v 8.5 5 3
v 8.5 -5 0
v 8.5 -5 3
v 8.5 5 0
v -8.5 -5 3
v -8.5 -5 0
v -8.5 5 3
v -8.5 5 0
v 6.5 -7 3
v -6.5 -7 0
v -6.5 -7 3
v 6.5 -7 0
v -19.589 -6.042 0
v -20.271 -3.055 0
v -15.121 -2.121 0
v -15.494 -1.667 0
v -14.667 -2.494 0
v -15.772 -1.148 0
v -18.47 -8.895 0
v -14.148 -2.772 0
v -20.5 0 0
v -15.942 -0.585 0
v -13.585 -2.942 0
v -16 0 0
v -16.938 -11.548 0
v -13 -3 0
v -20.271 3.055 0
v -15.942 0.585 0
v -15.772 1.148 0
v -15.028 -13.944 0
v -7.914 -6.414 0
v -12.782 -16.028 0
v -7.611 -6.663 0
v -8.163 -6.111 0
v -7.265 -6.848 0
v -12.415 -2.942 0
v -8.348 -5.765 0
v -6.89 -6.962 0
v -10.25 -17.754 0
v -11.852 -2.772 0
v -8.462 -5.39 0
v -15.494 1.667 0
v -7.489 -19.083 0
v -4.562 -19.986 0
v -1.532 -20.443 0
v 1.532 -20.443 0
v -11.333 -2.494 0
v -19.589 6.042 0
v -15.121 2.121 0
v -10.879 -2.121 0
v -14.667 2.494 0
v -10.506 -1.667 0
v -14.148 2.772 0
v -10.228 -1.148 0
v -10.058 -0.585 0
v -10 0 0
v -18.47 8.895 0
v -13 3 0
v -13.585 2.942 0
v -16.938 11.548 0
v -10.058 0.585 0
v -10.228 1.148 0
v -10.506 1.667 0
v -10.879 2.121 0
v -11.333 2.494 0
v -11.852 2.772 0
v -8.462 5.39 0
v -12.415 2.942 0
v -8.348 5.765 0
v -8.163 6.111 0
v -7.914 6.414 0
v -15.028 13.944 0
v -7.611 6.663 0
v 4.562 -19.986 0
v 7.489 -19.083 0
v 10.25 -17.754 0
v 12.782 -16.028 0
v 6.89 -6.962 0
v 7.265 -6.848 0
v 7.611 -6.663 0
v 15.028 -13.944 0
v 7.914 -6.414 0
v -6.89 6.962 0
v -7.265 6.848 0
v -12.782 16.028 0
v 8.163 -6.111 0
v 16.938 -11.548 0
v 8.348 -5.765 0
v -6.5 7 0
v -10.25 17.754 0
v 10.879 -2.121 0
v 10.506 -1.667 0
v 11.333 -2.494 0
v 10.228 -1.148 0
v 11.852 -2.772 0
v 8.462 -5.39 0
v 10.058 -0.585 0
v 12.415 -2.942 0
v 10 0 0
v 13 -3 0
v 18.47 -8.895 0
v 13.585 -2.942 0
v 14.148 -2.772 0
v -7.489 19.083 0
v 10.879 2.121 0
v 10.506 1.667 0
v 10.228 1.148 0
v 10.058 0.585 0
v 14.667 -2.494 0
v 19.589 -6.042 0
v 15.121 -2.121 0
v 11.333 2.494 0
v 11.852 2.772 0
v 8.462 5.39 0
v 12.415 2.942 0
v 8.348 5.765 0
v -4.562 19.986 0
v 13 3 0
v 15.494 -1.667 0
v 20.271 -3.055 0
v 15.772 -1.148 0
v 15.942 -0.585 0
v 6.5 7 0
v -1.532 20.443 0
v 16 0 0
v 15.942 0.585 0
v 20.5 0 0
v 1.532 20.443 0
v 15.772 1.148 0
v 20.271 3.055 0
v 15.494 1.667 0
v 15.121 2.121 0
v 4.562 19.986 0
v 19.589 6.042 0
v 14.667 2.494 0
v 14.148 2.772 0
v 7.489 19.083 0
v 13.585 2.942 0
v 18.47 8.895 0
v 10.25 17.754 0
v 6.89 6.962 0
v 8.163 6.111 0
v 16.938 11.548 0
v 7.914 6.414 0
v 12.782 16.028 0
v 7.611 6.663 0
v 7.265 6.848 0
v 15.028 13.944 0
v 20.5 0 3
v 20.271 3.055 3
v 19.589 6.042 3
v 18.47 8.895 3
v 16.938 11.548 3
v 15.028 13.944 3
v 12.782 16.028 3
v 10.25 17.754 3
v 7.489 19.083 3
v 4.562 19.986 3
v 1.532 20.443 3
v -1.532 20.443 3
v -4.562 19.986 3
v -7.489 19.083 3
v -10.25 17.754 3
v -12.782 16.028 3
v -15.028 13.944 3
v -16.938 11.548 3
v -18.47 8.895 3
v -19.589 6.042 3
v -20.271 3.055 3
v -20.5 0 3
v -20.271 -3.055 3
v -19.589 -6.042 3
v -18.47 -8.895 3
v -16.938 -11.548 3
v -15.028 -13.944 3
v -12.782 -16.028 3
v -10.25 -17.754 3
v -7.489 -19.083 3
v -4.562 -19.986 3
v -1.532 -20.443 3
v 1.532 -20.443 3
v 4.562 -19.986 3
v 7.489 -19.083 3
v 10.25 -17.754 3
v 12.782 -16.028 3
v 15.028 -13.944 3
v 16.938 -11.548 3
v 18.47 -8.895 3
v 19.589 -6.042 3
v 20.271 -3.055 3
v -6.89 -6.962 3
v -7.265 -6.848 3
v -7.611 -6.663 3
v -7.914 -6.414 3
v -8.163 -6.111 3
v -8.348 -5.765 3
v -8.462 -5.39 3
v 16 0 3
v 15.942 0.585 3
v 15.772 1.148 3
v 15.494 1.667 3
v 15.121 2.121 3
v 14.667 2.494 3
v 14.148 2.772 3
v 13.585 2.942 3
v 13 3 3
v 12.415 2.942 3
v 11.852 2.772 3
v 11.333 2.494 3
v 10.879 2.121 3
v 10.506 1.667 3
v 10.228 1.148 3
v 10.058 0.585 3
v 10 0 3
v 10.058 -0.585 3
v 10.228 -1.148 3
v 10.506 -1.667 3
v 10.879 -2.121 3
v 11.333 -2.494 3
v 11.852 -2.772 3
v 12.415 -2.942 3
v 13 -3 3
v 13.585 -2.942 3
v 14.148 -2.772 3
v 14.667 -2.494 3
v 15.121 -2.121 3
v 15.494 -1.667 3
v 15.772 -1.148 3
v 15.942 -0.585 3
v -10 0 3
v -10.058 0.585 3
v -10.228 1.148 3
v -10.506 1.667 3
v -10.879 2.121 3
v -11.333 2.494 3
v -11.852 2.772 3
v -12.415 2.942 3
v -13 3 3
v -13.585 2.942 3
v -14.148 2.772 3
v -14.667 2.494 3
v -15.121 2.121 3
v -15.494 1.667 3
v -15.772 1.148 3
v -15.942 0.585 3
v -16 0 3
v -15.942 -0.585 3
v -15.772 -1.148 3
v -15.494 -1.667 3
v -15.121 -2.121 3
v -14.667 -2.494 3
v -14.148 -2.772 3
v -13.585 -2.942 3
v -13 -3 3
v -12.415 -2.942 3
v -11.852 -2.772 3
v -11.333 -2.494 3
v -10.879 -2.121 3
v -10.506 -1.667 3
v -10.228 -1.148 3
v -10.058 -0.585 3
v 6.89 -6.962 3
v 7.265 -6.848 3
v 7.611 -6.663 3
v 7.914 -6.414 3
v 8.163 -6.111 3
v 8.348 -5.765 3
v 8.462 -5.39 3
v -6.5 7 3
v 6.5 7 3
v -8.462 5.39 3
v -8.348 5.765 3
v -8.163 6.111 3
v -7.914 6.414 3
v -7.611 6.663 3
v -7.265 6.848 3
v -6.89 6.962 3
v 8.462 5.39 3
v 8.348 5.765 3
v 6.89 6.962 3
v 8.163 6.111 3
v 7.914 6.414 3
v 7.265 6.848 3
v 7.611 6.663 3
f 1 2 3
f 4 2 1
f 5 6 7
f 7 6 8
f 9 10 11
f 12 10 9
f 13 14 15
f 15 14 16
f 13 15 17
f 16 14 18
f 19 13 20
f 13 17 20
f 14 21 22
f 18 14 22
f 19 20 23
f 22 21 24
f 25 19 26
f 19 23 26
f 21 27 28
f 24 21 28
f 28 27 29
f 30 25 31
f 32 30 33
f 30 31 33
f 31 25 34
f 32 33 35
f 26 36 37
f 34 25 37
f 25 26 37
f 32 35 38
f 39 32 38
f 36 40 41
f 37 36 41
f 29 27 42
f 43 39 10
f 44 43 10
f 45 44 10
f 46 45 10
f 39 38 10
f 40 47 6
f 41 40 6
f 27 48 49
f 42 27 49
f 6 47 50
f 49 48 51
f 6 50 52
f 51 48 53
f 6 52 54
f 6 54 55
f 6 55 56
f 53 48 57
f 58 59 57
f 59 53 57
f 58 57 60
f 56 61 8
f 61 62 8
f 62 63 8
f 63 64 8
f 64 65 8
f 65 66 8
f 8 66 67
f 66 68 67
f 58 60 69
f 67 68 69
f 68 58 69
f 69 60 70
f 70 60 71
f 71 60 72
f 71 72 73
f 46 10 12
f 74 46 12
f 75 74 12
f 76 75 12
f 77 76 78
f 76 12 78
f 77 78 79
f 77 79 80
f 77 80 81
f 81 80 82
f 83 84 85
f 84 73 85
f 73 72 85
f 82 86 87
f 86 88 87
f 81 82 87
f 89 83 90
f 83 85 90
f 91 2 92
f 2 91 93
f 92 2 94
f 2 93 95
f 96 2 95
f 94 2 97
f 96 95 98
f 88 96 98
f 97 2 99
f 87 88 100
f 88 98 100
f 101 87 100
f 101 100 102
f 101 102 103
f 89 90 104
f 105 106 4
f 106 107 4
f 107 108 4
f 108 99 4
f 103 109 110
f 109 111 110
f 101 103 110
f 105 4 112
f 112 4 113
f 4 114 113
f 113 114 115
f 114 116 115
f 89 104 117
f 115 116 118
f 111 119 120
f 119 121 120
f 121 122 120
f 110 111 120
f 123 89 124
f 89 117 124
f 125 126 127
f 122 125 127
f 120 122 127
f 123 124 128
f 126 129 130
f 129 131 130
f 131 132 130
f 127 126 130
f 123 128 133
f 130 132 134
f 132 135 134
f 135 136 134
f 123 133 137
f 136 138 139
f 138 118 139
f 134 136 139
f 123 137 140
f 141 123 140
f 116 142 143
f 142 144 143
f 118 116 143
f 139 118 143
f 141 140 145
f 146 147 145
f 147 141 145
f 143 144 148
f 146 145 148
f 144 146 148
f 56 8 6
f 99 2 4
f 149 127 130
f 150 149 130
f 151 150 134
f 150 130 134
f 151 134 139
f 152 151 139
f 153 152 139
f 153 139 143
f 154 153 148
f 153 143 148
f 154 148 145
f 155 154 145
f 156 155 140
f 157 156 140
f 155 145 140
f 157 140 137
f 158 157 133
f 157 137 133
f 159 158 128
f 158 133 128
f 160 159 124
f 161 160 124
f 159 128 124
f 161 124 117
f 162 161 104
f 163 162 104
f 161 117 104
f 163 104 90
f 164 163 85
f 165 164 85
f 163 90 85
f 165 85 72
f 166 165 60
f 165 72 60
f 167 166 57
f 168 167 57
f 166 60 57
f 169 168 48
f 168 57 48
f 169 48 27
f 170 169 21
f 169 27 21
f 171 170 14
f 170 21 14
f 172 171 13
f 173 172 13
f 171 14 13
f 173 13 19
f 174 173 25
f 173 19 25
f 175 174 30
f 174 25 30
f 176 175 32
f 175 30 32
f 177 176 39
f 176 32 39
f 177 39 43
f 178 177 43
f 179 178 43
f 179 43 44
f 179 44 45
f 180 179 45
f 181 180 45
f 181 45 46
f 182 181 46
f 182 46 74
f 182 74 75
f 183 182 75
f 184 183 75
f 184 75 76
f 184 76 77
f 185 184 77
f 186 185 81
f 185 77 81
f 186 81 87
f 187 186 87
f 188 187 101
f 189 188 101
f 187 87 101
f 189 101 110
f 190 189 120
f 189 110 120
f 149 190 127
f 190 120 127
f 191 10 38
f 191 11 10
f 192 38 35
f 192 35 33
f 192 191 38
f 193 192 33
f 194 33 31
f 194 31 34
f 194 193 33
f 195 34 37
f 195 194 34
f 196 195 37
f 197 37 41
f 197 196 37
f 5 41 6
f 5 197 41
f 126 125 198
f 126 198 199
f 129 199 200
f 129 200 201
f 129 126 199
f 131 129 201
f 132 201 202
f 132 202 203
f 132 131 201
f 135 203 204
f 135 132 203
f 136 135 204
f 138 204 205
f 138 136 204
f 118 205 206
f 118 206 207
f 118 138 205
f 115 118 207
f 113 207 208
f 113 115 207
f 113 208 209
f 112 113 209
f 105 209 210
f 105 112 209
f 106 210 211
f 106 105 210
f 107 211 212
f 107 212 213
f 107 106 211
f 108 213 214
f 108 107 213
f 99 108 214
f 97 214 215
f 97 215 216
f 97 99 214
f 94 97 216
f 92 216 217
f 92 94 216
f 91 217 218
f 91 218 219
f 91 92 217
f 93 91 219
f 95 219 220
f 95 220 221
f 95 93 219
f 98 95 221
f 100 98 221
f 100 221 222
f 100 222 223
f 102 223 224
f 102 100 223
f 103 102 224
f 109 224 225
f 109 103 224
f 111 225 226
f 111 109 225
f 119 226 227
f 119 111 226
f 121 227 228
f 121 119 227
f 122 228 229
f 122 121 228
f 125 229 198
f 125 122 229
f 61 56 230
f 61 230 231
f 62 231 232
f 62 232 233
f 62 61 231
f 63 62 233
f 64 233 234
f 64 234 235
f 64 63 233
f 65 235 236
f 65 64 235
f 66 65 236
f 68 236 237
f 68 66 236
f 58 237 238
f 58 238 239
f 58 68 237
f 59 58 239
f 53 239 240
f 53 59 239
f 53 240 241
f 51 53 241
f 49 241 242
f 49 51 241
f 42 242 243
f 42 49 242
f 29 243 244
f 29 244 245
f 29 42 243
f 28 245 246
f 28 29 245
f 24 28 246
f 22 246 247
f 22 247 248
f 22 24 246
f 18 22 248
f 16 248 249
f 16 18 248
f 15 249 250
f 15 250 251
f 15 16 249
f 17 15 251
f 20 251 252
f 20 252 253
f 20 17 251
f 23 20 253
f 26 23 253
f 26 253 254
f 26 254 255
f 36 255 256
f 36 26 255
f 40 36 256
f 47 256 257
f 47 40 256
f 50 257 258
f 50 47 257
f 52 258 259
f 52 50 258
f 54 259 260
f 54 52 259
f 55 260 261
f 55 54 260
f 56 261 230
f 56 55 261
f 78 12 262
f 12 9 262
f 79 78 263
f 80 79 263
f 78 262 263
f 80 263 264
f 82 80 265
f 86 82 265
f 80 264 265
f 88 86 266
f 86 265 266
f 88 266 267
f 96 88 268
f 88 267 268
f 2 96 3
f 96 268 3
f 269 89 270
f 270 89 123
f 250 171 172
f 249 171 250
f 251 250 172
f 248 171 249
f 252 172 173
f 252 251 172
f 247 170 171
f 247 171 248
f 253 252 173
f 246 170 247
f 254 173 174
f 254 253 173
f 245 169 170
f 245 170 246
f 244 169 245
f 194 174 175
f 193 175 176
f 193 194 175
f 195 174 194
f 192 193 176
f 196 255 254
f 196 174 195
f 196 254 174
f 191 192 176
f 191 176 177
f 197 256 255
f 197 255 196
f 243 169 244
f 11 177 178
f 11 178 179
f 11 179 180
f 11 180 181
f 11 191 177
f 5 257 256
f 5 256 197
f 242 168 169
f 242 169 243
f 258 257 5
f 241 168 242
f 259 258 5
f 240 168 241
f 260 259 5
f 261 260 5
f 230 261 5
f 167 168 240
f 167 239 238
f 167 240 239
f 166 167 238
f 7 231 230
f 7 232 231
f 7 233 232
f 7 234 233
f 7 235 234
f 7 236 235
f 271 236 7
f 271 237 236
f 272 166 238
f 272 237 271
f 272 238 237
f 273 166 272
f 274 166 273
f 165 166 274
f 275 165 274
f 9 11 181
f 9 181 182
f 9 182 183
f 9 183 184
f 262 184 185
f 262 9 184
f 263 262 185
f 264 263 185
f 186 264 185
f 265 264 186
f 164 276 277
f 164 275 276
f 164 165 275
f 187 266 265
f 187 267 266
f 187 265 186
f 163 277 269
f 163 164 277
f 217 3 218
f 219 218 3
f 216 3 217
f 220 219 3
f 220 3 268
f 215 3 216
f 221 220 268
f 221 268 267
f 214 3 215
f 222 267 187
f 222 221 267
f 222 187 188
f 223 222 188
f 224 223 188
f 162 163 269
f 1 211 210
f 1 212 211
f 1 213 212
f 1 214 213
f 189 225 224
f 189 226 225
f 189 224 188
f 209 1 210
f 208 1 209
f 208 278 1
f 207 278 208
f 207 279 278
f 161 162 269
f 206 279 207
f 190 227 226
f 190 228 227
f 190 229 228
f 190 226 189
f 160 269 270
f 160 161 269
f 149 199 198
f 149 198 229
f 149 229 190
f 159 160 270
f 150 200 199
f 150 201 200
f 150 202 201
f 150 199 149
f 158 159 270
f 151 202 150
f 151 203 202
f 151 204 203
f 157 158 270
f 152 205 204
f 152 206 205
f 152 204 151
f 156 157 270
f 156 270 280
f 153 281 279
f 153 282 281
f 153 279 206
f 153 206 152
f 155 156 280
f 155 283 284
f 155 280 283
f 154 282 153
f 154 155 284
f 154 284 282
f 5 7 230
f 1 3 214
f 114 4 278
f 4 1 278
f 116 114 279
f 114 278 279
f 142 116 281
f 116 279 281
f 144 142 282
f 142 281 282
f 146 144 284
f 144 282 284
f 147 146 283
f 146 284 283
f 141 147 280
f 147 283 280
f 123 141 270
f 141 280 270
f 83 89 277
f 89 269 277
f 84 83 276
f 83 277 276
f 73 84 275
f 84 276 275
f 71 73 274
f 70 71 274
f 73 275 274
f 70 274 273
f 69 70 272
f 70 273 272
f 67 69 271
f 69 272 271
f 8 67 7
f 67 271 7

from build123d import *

# Parameters (mm, degrees)
SKETCH1_R           = 20.5
SKETCH1_R_2         = 3
SKETCH1_W           = 17
SKETCH1_H           = 14
BOSS_EXTRUDE1_DEPTH = 3
FILLET1_R           = 2


with BuildPart() as part:
    # Sketch1 → Boss-Extrude1 (new body)
    with BuildSketch(Plane.XY):
        Circle(SKETCH1_R)
        with Locations((-13, 0)):
            Circle(SKETCH1_R_2, mode=Mode.SUBTRACT)
        with Locations((13, 0)):
            Circle(SKETCH1_R_2, mode=Mode.SUBTRACT)
        Rectangle(SKETCH1_W, SKETCH1_H, mode=Mode.SUBTRACT)
    extrude(amount=BOSS_EXTRUDE1_DEPTH)

    # Fillet1
    fillet1_edges = [part.edges().sort_by_distance(p)[0] for p in [
        (8.5, -7, 1.5),
        (8.5, 7, 1.5),
        (-8.5, 7, 1.5),
        (-8.5, -7, 1.5),
    ]]
    fillet(fillet1_edges, radius=FILLET1_R)


solid = part.part
